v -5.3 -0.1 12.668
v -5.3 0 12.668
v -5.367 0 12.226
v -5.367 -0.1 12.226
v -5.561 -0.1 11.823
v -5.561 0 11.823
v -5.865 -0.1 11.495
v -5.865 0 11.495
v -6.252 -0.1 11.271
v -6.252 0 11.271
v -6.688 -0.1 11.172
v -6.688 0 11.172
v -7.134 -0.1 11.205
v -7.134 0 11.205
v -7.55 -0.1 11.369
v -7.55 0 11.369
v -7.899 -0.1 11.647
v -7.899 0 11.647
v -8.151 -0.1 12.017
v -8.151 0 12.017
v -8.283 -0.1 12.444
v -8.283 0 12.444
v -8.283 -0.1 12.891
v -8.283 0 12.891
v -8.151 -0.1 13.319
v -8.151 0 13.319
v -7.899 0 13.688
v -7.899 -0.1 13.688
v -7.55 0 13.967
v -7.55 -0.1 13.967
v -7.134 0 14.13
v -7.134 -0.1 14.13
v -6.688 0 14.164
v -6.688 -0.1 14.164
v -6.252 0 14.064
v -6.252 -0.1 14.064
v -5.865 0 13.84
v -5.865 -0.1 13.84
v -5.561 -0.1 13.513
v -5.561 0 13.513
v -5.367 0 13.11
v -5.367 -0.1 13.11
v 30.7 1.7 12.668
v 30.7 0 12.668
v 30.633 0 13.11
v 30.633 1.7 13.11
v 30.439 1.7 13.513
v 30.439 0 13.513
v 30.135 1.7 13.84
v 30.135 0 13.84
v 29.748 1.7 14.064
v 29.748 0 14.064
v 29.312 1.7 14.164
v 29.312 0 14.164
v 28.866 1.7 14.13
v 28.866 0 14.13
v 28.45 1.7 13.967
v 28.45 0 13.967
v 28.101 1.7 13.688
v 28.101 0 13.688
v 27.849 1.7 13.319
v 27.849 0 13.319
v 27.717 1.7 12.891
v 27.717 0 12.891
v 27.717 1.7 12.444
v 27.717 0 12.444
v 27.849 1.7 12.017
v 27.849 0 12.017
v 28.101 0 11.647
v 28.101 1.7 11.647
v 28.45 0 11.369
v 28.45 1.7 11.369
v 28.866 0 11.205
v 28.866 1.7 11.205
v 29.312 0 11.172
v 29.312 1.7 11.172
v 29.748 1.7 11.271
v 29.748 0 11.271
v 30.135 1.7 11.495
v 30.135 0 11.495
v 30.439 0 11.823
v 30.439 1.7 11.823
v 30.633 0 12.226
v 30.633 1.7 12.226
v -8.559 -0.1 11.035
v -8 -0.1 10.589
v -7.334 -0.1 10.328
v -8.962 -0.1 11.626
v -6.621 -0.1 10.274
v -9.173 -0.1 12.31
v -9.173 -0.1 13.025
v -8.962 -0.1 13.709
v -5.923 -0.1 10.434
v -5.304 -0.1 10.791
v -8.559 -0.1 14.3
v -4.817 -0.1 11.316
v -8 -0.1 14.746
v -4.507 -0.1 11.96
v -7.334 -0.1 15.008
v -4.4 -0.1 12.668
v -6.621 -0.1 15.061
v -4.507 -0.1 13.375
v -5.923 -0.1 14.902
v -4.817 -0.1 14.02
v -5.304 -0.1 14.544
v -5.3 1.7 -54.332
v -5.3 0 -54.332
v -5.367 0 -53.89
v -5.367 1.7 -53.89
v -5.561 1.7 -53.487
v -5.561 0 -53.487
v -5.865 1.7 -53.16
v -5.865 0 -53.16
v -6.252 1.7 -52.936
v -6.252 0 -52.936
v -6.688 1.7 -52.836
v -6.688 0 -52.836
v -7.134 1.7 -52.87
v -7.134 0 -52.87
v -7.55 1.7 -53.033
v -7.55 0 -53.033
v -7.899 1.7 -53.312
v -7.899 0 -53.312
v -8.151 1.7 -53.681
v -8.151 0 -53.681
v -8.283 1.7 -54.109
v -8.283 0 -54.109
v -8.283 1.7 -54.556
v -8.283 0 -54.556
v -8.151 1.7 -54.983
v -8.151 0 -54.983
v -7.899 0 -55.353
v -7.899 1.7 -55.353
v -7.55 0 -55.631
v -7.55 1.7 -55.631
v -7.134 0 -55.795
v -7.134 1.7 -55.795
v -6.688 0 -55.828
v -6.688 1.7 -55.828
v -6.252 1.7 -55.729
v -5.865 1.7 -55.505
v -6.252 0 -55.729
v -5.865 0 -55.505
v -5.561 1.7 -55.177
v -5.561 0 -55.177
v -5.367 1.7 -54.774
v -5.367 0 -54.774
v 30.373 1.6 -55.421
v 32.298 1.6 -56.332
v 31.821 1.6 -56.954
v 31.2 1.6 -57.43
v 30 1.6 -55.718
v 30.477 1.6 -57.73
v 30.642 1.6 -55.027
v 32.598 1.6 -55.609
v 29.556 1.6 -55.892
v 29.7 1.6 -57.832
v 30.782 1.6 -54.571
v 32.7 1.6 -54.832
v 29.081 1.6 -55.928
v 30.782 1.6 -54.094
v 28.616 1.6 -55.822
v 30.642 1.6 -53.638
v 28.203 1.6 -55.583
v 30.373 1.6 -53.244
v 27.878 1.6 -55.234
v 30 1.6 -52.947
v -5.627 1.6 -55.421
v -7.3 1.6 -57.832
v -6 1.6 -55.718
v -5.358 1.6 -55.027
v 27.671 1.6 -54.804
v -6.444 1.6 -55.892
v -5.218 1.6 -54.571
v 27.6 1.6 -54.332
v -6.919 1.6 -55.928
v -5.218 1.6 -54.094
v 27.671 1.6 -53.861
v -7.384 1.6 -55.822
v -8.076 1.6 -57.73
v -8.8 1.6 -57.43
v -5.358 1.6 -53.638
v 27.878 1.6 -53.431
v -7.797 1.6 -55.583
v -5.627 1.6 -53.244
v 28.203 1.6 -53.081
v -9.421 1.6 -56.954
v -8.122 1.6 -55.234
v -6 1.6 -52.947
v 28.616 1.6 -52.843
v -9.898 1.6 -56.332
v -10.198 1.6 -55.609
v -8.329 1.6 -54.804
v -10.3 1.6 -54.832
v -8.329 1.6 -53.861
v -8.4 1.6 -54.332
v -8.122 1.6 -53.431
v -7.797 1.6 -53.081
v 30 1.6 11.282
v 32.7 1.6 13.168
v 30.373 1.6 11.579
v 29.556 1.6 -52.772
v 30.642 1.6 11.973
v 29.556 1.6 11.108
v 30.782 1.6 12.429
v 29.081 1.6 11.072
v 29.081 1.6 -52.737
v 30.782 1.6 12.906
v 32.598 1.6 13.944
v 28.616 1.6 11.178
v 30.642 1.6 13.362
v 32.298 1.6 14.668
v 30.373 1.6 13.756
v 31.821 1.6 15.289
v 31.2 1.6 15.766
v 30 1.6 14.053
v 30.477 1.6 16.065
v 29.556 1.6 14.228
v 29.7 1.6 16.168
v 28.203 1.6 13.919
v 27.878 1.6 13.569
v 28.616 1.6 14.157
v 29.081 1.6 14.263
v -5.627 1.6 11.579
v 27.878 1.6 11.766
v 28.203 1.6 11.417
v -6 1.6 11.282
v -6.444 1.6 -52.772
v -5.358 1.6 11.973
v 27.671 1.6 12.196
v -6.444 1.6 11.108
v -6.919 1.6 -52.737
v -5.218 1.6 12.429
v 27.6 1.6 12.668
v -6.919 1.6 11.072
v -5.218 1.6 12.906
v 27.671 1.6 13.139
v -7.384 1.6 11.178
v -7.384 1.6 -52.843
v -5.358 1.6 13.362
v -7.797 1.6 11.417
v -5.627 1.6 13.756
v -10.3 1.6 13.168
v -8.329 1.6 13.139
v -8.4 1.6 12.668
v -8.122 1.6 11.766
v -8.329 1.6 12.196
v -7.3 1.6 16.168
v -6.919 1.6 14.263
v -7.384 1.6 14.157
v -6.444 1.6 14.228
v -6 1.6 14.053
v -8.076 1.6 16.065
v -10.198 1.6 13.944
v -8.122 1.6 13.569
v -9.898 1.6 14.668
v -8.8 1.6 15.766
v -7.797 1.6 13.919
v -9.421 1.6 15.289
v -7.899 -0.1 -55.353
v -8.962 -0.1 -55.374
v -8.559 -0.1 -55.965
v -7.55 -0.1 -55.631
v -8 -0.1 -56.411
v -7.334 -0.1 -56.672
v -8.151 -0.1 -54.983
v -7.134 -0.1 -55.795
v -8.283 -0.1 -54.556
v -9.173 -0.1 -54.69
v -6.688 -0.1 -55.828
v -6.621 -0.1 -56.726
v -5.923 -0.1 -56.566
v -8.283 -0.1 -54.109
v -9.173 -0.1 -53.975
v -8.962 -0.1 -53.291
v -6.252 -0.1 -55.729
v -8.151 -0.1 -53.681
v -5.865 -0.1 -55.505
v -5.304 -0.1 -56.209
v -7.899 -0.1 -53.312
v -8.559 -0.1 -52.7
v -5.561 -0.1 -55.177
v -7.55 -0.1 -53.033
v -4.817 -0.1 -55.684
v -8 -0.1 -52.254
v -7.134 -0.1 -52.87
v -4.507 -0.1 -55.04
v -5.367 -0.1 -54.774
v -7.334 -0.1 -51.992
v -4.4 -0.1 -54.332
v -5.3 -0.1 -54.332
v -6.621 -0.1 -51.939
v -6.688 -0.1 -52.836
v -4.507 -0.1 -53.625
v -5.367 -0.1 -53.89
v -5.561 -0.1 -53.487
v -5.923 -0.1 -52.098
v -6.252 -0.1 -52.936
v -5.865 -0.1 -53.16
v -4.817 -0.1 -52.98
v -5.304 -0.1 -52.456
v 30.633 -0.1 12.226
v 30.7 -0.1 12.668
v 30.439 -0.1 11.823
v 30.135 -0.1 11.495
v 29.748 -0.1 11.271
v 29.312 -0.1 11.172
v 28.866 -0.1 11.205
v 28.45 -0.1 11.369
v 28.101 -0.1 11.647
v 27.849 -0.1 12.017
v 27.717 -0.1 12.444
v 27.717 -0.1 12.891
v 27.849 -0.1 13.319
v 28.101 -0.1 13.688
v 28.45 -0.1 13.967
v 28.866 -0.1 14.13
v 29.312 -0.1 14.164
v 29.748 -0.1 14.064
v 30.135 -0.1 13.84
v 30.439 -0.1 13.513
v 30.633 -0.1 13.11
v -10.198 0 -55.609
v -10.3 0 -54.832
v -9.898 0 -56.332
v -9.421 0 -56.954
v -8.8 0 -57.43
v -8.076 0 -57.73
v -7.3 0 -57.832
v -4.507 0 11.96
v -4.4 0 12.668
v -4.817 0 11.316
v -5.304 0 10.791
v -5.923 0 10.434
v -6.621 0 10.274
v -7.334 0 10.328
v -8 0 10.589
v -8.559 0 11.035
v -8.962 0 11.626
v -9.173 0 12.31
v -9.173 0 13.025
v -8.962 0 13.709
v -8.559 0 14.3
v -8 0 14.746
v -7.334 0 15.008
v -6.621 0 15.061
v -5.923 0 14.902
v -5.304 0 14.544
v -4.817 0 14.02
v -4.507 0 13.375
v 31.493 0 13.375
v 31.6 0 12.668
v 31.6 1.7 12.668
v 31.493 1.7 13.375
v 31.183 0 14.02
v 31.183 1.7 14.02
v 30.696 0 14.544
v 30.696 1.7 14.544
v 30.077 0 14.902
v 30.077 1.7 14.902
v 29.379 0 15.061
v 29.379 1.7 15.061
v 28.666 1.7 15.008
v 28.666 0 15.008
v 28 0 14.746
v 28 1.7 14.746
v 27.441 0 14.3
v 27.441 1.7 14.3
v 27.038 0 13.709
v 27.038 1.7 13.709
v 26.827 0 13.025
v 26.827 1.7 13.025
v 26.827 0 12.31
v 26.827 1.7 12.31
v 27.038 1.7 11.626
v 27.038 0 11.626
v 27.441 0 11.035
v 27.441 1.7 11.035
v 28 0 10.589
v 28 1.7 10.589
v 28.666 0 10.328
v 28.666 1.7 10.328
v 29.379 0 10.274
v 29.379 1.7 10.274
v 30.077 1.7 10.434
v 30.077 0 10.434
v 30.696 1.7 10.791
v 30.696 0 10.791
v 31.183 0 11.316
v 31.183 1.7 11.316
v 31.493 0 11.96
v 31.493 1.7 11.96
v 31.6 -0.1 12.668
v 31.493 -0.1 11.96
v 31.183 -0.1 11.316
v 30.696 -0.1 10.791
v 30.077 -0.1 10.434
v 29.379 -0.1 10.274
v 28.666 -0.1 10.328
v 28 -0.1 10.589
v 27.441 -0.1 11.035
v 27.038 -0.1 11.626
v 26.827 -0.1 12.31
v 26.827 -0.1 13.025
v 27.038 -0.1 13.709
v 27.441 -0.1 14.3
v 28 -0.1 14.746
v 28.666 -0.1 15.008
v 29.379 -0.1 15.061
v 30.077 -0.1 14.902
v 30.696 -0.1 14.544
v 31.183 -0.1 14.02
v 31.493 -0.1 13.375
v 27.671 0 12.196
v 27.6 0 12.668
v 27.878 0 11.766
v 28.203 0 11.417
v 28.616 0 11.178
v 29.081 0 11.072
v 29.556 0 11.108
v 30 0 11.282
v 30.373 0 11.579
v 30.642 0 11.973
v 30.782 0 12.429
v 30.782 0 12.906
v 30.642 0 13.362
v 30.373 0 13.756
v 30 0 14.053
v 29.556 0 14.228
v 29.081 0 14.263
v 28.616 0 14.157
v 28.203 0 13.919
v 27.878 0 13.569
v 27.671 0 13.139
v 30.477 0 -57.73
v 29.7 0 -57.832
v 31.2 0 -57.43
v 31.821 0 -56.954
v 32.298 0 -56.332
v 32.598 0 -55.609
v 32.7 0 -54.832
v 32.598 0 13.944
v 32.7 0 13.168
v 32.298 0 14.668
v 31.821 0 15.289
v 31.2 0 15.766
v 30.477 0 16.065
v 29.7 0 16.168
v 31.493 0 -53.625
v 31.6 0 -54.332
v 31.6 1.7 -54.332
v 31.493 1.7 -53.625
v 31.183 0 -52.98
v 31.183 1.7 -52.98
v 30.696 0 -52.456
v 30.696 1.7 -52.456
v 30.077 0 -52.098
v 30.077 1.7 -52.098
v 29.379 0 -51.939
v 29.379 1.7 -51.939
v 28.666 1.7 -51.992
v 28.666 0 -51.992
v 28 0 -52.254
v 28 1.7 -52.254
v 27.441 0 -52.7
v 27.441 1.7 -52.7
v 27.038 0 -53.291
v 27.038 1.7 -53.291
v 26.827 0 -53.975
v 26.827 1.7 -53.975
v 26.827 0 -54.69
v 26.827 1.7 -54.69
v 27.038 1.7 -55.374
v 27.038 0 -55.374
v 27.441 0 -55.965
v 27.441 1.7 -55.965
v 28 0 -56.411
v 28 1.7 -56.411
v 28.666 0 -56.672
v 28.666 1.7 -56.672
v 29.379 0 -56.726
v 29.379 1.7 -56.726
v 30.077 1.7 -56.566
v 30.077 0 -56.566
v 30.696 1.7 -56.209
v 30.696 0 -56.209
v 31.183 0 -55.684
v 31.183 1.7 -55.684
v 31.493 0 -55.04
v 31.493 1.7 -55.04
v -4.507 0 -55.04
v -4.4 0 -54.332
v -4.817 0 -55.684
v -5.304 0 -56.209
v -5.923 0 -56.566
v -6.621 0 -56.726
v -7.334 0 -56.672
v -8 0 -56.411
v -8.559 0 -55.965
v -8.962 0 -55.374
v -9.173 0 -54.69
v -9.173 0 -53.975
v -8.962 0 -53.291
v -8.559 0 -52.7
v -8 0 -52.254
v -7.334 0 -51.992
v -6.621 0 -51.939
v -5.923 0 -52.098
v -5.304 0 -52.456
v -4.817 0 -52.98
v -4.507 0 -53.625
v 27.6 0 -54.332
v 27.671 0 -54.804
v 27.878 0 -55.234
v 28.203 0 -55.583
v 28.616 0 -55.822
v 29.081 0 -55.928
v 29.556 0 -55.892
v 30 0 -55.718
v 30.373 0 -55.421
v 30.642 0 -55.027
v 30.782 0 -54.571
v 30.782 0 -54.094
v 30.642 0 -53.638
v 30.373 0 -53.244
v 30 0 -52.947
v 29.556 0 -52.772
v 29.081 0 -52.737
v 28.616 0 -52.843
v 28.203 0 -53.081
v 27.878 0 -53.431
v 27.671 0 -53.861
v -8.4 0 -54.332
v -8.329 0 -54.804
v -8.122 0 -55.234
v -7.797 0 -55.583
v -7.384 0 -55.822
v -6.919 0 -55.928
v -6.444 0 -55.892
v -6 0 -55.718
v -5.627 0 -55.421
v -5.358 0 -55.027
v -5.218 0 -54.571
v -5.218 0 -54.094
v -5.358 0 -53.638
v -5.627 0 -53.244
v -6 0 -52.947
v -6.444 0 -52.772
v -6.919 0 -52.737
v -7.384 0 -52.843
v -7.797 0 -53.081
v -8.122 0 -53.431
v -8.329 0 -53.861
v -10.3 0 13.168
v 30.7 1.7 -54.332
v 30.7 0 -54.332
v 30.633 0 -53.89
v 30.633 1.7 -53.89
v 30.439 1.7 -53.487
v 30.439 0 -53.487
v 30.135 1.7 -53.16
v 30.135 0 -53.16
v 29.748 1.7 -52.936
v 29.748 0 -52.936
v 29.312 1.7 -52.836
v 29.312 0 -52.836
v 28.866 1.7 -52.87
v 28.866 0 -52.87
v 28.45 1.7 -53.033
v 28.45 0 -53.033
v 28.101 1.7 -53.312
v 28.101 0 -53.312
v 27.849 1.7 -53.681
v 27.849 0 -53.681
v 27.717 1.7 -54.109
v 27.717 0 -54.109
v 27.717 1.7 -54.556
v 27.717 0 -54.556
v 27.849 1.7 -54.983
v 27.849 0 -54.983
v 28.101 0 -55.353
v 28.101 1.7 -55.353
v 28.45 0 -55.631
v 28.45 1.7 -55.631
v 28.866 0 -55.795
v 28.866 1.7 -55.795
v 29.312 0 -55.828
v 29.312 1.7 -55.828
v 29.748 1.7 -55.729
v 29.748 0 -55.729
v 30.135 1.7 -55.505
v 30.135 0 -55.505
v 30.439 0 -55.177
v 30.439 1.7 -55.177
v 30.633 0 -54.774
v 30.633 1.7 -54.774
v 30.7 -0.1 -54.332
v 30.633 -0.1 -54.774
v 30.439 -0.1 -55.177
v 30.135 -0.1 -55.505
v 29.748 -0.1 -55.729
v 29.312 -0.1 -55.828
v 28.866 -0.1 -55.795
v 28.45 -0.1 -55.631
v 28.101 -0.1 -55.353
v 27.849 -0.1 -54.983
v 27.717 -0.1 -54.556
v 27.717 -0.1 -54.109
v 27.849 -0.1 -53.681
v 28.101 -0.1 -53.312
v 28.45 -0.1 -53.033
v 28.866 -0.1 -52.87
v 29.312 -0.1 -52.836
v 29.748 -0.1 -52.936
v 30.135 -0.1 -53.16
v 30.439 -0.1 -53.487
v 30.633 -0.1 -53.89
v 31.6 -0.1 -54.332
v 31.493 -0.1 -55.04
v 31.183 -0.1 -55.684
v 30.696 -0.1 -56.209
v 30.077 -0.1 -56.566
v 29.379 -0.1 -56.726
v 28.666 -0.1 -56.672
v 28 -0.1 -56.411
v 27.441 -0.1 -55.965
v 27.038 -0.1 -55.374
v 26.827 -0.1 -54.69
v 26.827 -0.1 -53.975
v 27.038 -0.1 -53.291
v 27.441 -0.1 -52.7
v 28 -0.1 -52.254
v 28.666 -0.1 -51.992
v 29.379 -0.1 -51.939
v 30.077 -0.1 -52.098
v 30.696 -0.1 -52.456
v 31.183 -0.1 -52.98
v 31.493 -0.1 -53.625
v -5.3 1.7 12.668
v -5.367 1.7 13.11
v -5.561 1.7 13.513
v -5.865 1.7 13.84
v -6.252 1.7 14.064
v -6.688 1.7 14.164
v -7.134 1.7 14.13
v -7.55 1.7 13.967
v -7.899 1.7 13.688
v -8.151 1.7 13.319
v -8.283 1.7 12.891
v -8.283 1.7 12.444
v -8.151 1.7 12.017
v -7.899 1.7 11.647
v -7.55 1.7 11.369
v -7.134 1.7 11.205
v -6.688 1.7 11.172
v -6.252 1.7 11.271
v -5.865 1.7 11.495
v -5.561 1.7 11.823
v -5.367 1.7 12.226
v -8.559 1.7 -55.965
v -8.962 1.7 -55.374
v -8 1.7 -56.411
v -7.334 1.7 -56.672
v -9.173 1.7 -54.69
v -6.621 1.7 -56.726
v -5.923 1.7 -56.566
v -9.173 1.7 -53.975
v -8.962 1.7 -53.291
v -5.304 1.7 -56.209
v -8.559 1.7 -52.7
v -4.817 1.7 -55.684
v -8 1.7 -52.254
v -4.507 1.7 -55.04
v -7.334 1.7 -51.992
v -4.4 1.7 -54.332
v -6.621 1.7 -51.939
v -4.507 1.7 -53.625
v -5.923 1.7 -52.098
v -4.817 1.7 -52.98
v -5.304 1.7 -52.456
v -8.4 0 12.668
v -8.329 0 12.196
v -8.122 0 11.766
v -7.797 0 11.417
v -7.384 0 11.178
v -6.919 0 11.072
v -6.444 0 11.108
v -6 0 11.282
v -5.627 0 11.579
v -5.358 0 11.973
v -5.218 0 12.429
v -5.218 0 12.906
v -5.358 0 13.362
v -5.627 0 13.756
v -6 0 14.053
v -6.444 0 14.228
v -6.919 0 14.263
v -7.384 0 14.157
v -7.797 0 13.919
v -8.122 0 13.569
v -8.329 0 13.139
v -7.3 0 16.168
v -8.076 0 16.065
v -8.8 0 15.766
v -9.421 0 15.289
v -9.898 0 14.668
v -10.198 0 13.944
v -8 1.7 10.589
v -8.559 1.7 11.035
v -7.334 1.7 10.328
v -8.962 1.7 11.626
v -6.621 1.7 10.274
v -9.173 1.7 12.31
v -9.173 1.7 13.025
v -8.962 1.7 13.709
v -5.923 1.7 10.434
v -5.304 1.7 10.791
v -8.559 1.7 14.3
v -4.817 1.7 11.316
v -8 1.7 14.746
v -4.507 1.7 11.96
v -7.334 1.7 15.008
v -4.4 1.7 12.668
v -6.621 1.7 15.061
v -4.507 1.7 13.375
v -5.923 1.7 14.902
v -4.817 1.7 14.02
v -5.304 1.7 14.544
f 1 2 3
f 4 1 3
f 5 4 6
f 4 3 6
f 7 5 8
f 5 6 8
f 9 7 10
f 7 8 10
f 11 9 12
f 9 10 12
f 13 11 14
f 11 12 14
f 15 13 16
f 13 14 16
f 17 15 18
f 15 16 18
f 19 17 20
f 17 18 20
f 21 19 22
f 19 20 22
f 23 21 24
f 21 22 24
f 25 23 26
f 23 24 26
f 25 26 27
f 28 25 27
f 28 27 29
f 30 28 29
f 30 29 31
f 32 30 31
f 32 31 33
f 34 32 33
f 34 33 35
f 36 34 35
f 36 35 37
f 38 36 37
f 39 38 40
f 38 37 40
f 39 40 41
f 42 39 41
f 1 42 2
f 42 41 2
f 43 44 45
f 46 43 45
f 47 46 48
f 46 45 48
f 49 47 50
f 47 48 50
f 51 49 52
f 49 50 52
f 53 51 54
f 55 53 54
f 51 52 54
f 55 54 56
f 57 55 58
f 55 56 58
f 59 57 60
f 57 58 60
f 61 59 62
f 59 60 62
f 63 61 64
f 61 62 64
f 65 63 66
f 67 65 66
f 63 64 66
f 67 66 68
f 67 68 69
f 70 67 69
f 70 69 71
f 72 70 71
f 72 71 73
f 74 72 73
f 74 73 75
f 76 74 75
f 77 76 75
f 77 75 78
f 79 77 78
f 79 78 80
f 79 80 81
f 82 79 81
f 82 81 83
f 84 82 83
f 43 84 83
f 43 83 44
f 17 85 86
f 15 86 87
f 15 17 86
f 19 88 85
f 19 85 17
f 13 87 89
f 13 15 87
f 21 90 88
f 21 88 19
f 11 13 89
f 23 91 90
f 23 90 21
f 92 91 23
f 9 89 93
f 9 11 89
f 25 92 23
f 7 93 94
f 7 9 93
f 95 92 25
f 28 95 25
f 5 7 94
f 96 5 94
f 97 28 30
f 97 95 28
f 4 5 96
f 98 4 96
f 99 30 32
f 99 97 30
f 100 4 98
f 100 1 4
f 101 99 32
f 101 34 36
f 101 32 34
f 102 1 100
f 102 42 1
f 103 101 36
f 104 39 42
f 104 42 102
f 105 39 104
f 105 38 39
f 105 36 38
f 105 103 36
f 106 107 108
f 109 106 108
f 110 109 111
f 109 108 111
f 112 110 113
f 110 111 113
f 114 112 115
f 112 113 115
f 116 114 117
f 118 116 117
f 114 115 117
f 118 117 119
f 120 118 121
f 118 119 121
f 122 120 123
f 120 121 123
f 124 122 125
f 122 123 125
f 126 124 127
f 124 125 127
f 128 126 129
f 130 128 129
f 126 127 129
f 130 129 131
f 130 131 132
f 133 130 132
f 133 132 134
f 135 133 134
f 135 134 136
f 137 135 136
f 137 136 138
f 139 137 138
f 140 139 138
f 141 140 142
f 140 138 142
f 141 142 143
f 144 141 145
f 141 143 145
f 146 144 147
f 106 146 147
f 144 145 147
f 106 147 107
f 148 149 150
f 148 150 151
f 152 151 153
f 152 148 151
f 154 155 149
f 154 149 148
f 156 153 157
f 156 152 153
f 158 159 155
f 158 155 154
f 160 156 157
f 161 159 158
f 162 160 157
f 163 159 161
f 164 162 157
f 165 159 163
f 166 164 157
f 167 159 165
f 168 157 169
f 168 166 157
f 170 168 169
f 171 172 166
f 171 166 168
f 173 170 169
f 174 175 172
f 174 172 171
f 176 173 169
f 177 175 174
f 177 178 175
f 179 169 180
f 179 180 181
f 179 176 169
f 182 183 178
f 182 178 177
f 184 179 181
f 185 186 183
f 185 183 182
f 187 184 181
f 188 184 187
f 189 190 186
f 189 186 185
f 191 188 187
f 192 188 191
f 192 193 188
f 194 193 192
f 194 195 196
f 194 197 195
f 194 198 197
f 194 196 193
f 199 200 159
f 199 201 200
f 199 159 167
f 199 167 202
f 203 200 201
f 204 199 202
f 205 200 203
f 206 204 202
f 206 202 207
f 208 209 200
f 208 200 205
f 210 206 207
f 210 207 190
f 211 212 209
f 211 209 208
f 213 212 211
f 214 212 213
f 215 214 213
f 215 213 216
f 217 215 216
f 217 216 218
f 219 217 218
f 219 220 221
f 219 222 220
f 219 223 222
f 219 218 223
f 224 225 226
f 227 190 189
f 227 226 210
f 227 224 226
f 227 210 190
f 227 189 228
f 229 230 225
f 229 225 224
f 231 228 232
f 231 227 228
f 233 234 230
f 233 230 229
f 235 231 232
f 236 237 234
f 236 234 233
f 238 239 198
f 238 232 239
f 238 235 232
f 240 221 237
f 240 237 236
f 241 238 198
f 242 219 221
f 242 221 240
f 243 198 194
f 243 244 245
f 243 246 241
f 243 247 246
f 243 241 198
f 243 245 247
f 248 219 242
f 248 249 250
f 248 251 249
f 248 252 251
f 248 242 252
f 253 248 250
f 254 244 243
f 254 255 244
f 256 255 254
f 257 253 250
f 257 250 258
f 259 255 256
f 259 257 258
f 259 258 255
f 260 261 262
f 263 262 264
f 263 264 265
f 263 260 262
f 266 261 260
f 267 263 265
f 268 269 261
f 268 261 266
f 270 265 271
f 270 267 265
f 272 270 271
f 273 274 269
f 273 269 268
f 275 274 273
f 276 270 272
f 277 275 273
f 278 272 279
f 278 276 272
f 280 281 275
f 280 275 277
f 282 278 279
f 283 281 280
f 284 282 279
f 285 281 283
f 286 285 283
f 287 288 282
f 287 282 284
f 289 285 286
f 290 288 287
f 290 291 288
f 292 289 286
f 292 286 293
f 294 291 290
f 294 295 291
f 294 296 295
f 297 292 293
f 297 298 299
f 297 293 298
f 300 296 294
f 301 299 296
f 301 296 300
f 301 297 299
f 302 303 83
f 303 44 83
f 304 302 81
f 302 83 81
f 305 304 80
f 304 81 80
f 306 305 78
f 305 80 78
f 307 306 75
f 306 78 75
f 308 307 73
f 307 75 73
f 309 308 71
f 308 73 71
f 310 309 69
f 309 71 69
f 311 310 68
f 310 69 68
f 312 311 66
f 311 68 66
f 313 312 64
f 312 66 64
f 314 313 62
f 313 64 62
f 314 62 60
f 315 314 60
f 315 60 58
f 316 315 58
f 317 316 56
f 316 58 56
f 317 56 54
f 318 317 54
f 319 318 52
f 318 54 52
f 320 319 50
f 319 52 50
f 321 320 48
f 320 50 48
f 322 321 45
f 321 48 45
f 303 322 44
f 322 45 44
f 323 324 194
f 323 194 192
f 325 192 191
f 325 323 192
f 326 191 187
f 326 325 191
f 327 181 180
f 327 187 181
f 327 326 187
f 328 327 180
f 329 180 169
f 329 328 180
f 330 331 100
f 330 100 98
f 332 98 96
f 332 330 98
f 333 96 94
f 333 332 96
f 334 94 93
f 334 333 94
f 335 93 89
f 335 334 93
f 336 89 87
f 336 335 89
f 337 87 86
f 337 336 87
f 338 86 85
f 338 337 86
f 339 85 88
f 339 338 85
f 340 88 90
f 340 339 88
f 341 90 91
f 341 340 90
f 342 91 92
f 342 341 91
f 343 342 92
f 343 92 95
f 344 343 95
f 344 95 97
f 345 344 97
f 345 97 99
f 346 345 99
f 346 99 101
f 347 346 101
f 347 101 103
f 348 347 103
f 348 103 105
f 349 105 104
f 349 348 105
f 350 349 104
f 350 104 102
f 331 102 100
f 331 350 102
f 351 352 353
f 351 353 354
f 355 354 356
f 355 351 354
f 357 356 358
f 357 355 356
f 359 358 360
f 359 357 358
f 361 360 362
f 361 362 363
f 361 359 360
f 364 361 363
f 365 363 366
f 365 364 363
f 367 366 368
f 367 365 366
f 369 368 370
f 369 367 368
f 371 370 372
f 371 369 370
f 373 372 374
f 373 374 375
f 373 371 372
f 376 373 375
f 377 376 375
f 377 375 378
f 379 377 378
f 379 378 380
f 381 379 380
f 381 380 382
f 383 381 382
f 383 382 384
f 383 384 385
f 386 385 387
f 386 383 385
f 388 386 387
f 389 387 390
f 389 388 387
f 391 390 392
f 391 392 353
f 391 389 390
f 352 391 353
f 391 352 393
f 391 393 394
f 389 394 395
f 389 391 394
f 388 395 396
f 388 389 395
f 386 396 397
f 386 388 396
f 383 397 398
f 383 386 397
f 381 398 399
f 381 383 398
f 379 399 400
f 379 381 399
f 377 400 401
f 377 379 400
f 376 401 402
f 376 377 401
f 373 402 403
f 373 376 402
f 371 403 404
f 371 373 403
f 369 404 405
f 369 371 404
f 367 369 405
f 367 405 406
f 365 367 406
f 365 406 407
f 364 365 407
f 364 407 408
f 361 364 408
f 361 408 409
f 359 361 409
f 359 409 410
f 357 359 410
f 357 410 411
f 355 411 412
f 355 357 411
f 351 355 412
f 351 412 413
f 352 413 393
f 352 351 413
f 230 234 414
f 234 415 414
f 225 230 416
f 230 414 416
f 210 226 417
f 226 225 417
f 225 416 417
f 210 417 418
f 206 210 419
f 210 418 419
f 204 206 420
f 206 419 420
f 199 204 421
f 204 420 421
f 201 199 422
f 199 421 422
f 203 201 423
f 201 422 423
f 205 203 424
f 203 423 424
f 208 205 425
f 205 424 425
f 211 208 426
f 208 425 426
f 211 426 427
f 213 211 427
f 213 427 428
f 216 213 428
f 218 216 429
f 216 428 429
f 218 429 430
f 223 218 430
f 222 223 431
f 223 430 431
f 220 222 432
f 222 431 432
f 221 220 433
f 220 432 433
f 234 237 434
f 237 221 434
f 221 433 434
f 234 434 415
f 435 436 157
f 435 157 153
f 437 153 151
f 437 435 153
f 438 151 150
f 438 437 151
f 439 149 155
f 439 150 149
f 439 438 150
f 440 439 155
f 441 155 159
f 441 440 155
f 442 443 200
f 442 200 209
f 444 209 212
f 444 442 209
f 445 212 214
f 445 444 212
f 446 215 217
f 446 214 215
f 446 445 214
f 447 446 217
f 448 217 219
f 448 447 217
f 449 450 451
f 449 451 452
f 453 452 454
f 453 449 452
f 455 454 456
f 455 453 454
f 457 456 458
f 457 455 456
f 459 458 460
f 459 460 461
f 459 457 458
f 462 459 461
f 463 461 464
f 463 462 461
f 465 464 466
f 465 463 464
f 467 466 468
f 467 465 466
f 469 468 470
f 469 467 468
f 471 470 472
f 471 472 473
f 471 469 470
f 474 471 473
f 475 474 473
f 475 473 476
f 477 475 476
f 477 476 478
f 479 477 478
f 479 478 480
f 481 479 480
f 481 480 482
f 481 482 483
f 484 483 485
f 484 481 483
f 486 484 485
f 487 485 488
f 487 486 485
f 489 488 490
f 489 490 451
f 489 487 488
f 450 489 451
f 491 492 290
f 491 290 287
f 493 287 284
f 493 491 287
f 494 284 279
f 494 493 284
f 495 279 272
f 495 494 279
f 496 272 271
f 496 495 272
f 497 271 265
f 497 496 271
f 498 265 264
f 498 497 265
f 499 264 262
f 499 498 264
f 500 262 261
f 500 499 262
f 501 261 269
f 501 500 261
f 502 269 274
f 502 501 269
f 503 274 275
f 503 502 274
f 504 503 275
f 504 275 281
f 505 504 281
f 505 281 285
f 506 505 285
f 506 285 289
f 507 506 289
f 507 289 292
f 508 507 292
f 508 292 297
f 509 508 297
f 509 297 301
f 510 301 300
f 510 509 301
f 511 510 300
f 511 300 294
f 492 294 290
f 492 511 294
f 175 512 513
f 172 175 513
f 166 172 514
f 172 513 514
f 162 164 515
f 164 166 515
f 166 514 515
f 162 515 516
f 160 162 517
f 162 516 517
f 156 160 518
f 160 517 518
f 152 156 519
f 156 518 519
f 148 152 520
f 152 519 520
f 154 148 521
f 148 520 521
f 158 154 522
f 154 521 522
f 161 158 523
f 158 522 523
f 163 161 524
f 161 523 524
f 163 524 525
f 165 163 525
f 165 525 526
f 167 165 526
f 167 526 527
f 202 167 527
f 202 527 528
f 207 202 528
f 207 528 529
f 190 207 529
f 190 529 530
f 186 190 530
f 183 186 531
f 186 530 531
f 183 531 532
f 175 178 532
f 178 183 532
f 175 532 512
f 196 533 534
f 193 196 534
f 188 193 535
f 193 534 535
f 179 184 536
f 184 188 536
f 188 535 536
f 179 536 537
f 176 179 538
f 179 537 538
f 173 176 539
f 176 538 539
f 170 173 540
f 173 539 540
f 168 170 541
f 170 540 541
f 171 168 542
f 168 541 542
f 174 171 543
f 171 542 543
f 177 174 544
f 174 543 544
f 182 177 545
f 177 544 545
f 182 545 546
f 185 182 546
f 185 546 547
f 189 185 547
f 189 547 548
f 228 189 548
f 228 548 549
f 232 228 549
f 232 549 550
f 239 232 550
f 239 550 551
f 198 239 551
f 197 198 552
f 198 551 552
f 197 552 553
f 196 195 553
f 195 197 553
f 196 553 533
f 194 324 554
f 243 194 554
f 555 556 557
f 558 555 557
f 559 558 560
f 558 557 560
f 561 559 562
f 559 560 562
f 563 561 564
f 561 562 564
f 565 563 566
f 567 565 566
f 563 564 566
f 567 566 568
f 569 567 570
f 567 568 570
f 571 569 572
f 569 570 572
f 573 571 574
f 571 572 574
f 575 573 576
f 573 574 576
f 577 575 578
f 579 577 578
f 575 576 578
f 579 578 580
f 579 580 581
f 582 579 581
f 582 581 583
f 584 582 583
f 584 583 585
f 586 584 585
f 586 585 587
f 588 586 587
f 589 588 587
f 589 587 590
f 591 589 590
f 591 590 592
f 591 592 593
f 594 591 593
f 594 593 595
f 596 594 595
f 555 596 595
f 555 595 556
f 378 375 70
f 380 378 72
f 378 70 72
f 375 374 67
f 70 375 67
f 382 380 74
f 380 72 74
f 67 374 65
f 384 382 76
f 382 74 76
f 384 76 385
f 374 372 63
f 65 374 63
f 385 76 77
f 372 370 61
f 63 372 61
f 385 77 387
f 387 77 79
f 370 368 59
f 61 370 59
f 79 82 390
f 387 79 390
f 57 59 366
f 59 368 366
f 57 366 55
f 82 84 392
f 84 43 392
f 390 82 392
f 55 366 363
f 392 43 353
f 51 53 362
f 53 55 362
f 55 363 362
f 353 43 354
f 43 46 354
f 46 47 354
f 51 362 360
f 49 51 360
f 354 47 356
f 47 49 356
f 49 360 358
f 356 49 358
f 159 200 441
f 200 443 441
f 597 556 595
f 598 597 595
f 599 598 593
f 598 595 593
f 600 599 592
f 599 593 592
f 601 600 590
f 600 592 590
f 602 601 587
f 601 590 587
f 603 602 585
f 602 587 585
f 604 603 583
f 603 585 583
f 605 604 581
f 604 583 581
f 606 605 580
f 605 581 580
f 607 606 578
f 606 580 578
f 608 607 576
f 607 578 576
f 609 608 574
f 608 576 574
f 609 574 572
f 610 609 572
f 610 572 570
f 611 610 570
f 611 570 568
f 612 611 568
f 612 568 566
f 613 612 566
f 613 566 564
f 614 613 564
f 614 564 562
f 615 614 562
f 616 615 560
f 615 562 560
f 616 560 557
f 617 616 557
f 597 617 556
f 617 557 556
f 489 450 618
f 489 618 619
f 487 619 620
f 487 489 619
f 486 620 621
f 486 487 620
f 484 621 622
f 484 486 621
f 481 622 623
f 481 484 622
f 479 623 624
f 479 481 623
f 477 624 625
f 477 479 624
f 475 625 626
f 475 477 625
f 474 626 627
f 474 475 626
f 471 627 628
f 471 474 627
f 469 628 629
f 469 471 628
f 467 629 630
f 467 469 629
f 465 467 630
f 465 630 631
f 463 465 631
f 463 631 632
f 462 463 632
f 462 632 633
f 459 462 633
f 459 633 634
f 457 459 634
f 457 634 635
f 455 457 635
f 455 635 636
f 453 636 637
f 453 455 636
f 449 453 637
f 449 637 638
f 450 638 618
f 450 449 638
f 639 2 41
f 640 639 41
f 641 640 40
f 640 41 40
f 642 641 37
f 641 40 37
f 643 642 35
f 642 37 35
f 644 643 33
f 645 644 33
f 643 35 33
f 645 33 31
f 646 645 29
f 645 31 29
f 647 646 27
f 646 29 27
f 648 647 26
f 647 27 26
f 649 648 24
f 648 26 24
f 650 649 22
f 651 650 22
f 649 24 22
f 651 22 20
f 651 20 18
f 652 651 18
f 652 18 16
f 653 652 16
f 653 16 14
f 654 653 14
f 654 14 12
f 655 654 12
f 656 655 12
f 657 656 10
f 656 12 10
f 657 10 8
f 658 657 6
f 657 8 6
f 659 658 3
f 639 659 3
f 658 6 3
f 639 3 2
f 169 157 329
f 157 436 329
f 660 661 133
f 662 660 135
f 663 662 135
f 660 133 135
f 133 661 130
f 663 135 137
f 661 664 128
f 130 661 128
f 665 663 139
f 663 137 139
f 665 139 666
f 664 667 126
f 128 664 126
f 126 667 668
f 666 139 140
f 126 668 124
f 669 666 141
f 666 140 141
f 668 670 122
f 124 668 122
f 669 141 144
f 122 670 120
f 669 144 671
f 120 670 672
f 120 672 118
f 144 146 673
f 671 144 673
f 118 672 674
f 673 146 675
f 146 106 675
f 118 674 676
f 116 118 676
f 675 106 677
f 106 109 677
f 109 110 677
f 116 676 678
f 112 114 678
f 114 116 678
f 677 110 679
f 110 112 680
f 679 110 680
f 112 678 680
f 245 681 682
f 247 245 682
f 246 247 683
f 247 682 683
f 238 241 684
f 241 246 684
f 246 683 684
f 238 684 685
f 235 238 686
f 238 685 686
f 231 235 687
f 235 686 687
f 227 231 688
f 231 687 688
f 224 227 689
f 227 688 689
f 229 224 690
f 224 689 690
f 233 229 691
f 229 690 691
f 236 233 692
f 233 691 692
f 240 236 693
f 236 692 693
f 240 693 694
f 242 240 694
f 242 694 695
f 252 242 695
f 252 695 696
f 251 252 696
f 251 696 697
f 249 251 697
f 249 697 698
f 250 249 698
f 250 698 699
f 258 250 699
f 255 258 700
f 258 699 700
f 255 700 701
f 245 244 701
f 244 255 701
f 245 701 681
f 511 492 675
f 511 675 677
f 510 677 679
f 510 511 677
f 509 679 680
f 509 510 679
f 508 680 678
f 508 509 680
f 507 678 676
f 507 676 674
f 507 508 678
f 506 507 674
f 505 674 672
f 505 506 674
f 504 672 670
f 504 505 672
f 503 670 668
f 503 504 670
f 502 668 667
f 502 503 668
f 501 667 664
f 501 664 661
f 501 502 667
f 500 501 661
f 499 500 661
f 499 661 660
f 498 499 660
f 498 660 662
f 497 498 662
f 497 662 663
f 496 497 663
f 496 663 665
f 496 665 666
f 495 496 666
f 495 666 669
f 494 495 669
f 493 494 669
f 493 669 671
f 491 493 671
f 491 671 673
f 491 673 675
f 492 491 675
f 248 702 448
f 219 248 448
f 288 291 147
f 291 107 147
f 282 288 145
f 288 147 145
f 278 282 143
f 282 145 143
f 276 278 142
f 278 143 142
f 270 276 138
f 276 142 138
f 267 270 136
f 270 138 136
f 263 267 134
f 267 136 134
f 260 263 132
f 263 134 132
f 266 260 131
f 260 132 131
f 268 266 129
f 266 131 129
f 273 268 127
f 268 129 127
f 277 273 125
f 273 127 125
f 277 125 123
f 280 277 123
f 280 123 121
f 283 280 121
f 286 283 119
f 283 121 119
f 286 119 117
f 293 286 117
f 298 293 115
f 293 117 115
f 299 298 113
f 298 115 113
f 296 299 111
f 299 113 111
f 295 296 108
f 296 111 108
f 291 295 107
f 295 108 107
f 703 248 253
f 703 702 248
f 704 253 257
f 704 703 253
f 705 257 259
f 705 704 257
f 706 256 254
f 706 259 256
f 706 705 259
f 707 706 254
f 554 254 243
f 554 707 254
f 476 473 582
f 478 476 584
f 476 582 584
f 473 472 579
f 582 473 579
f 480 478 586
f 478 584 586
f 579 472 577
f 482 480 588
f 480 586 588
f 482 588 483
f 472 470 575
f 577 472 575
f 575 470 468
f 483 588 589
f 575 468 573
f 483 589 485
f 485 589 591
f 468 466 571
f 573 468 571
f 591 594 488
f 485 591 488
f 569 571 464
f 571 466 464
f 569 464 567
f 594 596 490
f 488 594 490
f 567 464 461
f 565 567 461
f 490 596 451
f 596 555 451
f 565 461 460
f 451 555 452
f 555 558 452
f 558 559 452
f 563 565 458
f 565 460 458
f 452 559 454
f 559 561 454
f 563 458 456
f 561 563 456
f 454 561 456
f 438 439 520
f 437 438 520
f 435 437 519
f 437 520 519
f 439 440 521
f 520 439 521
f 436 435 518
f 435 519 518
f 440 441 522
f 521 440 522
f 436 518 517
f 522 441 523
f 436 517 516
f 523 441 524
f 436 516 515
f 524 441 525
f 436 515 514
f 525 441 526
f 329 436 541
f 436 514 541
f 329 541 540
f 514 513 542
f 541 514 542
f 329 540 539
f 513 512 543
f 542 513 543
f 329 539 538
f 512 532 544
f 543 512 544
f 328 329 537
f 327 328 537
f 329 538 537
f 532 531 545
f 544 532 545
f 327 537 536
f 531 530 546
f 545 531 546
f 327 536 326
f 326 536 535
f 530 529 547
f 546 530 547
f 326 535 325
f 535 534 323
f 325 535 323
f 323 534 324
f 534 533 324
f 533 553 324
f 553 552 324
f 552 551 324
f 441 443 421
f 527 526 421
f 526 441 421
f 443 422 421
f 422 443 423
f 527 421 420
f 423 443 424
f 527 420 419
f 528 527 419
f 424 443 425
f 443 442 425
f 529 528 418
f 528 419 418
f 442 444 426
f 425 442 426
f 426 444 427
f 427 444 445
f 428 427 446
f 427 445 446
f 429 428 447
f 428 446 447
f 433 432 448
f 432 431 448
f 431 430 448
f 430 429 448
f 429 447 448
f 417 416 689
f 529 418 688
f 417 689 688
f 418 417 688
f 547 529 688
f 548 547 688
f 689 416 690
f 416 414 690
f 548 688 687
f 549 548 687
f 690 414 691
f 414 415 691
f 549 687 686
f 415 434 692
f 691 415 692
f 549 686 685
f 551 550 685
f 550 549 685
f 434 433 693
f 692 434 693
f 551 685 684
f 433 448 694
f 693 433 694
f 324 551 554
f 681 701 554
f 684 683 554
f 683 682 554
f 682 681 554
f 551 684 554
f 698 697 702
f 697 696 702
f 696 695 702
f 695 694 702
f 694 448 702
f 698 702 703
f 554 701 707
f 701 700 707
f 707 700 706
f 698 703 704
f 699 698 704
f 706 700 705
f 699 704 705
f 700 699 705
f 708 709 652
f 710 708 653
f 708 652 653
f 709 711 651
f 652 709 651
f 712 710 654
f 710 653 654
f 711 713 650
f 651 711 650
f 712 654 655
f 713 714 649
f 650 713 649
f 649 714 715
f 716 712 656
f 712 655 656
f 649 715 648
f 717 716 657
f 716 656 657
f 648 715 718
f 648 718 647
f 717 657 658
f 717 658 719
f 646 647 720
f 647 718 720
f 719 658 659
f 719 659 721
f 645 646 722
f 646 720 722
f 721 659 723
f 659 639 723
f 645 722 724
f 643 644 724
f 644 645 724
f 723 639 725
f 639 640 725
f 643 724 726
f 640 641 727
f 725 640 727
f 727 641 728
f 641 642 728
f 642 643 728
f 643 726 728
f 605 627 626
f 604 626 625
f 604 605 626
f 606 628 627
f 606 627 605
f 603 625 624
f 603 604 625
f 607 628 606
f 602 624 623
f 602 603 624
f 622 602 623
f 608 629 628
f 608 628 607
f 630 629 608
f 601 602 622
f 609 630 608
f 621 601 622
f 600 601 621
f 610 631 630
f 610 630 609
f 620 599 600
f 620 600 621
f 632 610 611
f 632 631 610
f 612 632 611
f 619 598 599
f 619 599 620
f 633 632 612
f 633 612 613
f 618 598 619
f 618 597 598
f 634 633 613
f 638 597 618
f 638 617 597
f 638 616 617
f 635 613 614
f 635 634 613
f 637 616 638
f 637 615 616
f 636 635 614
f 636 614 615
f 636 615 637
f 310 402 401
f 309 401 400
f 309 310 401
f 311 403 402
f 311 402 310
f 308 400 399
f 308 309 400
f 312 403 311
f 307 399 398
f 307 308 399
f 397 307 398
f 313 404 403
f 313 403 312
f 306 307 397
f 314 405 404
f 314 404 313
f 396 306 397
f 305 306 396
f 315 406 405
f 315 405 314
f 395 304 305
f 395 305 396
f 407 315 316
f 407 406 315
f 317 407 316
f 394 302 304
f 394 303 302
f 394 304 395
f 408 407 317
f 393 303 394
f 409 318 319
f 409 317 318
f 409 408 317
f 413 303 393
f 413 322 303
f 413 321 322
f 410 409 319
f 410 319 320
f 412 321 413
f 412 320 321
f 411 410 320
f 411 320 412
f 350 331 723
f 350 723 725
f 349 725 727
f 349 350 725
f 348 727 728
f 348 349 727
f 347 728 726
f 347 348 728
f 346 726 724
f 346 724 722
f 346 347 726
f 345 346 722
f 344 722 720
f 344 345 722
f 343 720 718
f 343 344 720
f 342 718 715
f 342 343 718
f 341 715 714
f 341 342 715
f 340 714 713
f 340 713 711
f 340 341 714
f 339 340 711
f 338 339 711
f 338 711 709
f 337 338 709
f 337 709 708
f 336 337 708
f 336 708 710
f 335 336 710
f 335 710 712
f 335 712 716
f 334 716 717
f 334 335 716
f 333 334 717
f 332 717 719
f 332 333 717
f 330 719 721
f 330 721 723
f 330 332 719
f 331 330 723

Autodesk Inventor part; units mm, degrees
ref_plane "YZ Plane" through (0, 0, 0) normal (1, 0, 0) x (0, 1, 0)
ref_plane "XZ Plane" through (0, 0, 0) normal (0, 1, 0) x (-1, 0, 0)
ref_plane "XY Plane" through (0, 0, 0) normal (0, 0, 1) x (1, 0, 0)
sketch "Sketch1" plane through (0, 0, 0) normal (0, 1, 0) x (-1, 0, 0)
  line L0 (7.2999, 16.1677) -> (-29.7001, 16.1677)
  line L1 (-32.7001, 13.1677) -> (-32.7001, -54.8323)
  line L2 (-29.7001, -57.8323) -> (7.2999, -57.8323)
  line L3 (10.2999, -54.8323) -> (10.2999, 13.1677)
  circle A0 centre (6.7999, 12.6677) radius 1.6
  circle A1 centre (-29.2001, 12.6677) radius 1.6
  circle A2 centre (-29.2001, -54.3323) radius 1.6
  circle A3 centre (6.7999, -54.3323) radius 1.6
  arc A4 (10.2999, 13.1677) -> (7.2999, 16.1677) centre (7.2999, 13.1677) ccw
  arc A5 (-29.7001, 16.1677) -> (-32.7001, 13.1677) centre (-29.7001, 13.1677) ccw
  arc A6 (-32.7001, -54.8323) -> (-29.7001, -57.8323) centre (-29.7001, -54.8323) ccw
  arc A7 (7.2999, -57.8323) -> (10.2999, -54.8323) centre (7.2999, -54.8323) ccw
  point P0 (0, 0)
  point P1 (-32.7001, -57.8323)
  point P2 (-32.7001, 16.1677)
  point P3 (10.2999, -57.8323)
  dimension "d0" = 43
  dimension "d1" = 74
  dimension "d6" = 3.2
  dimension "d7" = 3.2
  dimension "d8" = 3.2
  dimension "d9" = 3.2
  dimension "d10" = 3
  dimension "d33" = 67
  dimension "d34" = 36
  dimension "d35" = 36
extrude "Extrusion1" add sketch "Sketch1" along normal blind 1.6
sketch "Sketch2" plane through (0, 0, 0) normal (0, -1, 0) x (1, 0, 0)
  line L0 (32.7001, -54.8323) -> (32.7001, 13.1677) projected
  line L1 (29.7001, 16.1677) -> (-7.2999, 16.1677) projected
  line L2 (-7.2999, -57.8323) -> (29.7001, -57.8323) projected
  line L3 (32.7001, 16.1677) -> (32.7001, -57.8323) construction
  line L4 (32.7001, -57.8323) -> (-10.3024, -57.8323) construction
  line L5 (-10.3024, -57.8323) -> (-10.3024, 16.1677) construction
  line L6 (-10.3024, 16.1677) -> (32.7001, 16.1677) construction
  point P0 (0, 0)
decal "Decal2"
sketch "Sketch3" plane through (0, 0, 0) normal (0, -1, 0) x (1, 0, 0)
  circle A0 centre (29.2001, 12.6677) radius 1.6 projected
  circle A1 centre (29.2001, 12.6677) radius 2.4
  circle A2 centre (-6.7999, 12.6677) radius 1.6 projected
  circle A3 centre (-6.7999, 12.6677) radius 2.4
  circle A4 centre (-6.7999, -54.3323) radius 1.6 projected
  circle A5 centre (-6.7999, -54.3323) radius 2.4
  circle A6 centre (29.2001, -54.3323) radius 2.4
  circle A7 centre (29.2001, 12.6677) radius 1.5
  circle A8 centre (-6.7999, 12.6677) radius 1.5
  circle A9 centre (-6.7999, -54.3323) radius 1.5
  circle A10 centre (29.2001, -54.3323) radius 1.5
  point P0 (0, 0)
  dimension "d57" = 4.8
  dimension "d58" = 4.8
  dimension "d59" = 4.8
  dimension "d60" = 4.8
  dimension "d61" = 3
  dimension "d62" = 3
  dimension "d63" = 3
  dimension "d64" = 3
extrude "Extrusion2" add sketch "Sketch3" along normal blind 0.1 and the other way blind 1.7 separate body contours A0 | A1 | A2 | A3 | A4 | A5 | A6
properties part number "NX3224T024_011_PCB" material "ABS Plastic"
